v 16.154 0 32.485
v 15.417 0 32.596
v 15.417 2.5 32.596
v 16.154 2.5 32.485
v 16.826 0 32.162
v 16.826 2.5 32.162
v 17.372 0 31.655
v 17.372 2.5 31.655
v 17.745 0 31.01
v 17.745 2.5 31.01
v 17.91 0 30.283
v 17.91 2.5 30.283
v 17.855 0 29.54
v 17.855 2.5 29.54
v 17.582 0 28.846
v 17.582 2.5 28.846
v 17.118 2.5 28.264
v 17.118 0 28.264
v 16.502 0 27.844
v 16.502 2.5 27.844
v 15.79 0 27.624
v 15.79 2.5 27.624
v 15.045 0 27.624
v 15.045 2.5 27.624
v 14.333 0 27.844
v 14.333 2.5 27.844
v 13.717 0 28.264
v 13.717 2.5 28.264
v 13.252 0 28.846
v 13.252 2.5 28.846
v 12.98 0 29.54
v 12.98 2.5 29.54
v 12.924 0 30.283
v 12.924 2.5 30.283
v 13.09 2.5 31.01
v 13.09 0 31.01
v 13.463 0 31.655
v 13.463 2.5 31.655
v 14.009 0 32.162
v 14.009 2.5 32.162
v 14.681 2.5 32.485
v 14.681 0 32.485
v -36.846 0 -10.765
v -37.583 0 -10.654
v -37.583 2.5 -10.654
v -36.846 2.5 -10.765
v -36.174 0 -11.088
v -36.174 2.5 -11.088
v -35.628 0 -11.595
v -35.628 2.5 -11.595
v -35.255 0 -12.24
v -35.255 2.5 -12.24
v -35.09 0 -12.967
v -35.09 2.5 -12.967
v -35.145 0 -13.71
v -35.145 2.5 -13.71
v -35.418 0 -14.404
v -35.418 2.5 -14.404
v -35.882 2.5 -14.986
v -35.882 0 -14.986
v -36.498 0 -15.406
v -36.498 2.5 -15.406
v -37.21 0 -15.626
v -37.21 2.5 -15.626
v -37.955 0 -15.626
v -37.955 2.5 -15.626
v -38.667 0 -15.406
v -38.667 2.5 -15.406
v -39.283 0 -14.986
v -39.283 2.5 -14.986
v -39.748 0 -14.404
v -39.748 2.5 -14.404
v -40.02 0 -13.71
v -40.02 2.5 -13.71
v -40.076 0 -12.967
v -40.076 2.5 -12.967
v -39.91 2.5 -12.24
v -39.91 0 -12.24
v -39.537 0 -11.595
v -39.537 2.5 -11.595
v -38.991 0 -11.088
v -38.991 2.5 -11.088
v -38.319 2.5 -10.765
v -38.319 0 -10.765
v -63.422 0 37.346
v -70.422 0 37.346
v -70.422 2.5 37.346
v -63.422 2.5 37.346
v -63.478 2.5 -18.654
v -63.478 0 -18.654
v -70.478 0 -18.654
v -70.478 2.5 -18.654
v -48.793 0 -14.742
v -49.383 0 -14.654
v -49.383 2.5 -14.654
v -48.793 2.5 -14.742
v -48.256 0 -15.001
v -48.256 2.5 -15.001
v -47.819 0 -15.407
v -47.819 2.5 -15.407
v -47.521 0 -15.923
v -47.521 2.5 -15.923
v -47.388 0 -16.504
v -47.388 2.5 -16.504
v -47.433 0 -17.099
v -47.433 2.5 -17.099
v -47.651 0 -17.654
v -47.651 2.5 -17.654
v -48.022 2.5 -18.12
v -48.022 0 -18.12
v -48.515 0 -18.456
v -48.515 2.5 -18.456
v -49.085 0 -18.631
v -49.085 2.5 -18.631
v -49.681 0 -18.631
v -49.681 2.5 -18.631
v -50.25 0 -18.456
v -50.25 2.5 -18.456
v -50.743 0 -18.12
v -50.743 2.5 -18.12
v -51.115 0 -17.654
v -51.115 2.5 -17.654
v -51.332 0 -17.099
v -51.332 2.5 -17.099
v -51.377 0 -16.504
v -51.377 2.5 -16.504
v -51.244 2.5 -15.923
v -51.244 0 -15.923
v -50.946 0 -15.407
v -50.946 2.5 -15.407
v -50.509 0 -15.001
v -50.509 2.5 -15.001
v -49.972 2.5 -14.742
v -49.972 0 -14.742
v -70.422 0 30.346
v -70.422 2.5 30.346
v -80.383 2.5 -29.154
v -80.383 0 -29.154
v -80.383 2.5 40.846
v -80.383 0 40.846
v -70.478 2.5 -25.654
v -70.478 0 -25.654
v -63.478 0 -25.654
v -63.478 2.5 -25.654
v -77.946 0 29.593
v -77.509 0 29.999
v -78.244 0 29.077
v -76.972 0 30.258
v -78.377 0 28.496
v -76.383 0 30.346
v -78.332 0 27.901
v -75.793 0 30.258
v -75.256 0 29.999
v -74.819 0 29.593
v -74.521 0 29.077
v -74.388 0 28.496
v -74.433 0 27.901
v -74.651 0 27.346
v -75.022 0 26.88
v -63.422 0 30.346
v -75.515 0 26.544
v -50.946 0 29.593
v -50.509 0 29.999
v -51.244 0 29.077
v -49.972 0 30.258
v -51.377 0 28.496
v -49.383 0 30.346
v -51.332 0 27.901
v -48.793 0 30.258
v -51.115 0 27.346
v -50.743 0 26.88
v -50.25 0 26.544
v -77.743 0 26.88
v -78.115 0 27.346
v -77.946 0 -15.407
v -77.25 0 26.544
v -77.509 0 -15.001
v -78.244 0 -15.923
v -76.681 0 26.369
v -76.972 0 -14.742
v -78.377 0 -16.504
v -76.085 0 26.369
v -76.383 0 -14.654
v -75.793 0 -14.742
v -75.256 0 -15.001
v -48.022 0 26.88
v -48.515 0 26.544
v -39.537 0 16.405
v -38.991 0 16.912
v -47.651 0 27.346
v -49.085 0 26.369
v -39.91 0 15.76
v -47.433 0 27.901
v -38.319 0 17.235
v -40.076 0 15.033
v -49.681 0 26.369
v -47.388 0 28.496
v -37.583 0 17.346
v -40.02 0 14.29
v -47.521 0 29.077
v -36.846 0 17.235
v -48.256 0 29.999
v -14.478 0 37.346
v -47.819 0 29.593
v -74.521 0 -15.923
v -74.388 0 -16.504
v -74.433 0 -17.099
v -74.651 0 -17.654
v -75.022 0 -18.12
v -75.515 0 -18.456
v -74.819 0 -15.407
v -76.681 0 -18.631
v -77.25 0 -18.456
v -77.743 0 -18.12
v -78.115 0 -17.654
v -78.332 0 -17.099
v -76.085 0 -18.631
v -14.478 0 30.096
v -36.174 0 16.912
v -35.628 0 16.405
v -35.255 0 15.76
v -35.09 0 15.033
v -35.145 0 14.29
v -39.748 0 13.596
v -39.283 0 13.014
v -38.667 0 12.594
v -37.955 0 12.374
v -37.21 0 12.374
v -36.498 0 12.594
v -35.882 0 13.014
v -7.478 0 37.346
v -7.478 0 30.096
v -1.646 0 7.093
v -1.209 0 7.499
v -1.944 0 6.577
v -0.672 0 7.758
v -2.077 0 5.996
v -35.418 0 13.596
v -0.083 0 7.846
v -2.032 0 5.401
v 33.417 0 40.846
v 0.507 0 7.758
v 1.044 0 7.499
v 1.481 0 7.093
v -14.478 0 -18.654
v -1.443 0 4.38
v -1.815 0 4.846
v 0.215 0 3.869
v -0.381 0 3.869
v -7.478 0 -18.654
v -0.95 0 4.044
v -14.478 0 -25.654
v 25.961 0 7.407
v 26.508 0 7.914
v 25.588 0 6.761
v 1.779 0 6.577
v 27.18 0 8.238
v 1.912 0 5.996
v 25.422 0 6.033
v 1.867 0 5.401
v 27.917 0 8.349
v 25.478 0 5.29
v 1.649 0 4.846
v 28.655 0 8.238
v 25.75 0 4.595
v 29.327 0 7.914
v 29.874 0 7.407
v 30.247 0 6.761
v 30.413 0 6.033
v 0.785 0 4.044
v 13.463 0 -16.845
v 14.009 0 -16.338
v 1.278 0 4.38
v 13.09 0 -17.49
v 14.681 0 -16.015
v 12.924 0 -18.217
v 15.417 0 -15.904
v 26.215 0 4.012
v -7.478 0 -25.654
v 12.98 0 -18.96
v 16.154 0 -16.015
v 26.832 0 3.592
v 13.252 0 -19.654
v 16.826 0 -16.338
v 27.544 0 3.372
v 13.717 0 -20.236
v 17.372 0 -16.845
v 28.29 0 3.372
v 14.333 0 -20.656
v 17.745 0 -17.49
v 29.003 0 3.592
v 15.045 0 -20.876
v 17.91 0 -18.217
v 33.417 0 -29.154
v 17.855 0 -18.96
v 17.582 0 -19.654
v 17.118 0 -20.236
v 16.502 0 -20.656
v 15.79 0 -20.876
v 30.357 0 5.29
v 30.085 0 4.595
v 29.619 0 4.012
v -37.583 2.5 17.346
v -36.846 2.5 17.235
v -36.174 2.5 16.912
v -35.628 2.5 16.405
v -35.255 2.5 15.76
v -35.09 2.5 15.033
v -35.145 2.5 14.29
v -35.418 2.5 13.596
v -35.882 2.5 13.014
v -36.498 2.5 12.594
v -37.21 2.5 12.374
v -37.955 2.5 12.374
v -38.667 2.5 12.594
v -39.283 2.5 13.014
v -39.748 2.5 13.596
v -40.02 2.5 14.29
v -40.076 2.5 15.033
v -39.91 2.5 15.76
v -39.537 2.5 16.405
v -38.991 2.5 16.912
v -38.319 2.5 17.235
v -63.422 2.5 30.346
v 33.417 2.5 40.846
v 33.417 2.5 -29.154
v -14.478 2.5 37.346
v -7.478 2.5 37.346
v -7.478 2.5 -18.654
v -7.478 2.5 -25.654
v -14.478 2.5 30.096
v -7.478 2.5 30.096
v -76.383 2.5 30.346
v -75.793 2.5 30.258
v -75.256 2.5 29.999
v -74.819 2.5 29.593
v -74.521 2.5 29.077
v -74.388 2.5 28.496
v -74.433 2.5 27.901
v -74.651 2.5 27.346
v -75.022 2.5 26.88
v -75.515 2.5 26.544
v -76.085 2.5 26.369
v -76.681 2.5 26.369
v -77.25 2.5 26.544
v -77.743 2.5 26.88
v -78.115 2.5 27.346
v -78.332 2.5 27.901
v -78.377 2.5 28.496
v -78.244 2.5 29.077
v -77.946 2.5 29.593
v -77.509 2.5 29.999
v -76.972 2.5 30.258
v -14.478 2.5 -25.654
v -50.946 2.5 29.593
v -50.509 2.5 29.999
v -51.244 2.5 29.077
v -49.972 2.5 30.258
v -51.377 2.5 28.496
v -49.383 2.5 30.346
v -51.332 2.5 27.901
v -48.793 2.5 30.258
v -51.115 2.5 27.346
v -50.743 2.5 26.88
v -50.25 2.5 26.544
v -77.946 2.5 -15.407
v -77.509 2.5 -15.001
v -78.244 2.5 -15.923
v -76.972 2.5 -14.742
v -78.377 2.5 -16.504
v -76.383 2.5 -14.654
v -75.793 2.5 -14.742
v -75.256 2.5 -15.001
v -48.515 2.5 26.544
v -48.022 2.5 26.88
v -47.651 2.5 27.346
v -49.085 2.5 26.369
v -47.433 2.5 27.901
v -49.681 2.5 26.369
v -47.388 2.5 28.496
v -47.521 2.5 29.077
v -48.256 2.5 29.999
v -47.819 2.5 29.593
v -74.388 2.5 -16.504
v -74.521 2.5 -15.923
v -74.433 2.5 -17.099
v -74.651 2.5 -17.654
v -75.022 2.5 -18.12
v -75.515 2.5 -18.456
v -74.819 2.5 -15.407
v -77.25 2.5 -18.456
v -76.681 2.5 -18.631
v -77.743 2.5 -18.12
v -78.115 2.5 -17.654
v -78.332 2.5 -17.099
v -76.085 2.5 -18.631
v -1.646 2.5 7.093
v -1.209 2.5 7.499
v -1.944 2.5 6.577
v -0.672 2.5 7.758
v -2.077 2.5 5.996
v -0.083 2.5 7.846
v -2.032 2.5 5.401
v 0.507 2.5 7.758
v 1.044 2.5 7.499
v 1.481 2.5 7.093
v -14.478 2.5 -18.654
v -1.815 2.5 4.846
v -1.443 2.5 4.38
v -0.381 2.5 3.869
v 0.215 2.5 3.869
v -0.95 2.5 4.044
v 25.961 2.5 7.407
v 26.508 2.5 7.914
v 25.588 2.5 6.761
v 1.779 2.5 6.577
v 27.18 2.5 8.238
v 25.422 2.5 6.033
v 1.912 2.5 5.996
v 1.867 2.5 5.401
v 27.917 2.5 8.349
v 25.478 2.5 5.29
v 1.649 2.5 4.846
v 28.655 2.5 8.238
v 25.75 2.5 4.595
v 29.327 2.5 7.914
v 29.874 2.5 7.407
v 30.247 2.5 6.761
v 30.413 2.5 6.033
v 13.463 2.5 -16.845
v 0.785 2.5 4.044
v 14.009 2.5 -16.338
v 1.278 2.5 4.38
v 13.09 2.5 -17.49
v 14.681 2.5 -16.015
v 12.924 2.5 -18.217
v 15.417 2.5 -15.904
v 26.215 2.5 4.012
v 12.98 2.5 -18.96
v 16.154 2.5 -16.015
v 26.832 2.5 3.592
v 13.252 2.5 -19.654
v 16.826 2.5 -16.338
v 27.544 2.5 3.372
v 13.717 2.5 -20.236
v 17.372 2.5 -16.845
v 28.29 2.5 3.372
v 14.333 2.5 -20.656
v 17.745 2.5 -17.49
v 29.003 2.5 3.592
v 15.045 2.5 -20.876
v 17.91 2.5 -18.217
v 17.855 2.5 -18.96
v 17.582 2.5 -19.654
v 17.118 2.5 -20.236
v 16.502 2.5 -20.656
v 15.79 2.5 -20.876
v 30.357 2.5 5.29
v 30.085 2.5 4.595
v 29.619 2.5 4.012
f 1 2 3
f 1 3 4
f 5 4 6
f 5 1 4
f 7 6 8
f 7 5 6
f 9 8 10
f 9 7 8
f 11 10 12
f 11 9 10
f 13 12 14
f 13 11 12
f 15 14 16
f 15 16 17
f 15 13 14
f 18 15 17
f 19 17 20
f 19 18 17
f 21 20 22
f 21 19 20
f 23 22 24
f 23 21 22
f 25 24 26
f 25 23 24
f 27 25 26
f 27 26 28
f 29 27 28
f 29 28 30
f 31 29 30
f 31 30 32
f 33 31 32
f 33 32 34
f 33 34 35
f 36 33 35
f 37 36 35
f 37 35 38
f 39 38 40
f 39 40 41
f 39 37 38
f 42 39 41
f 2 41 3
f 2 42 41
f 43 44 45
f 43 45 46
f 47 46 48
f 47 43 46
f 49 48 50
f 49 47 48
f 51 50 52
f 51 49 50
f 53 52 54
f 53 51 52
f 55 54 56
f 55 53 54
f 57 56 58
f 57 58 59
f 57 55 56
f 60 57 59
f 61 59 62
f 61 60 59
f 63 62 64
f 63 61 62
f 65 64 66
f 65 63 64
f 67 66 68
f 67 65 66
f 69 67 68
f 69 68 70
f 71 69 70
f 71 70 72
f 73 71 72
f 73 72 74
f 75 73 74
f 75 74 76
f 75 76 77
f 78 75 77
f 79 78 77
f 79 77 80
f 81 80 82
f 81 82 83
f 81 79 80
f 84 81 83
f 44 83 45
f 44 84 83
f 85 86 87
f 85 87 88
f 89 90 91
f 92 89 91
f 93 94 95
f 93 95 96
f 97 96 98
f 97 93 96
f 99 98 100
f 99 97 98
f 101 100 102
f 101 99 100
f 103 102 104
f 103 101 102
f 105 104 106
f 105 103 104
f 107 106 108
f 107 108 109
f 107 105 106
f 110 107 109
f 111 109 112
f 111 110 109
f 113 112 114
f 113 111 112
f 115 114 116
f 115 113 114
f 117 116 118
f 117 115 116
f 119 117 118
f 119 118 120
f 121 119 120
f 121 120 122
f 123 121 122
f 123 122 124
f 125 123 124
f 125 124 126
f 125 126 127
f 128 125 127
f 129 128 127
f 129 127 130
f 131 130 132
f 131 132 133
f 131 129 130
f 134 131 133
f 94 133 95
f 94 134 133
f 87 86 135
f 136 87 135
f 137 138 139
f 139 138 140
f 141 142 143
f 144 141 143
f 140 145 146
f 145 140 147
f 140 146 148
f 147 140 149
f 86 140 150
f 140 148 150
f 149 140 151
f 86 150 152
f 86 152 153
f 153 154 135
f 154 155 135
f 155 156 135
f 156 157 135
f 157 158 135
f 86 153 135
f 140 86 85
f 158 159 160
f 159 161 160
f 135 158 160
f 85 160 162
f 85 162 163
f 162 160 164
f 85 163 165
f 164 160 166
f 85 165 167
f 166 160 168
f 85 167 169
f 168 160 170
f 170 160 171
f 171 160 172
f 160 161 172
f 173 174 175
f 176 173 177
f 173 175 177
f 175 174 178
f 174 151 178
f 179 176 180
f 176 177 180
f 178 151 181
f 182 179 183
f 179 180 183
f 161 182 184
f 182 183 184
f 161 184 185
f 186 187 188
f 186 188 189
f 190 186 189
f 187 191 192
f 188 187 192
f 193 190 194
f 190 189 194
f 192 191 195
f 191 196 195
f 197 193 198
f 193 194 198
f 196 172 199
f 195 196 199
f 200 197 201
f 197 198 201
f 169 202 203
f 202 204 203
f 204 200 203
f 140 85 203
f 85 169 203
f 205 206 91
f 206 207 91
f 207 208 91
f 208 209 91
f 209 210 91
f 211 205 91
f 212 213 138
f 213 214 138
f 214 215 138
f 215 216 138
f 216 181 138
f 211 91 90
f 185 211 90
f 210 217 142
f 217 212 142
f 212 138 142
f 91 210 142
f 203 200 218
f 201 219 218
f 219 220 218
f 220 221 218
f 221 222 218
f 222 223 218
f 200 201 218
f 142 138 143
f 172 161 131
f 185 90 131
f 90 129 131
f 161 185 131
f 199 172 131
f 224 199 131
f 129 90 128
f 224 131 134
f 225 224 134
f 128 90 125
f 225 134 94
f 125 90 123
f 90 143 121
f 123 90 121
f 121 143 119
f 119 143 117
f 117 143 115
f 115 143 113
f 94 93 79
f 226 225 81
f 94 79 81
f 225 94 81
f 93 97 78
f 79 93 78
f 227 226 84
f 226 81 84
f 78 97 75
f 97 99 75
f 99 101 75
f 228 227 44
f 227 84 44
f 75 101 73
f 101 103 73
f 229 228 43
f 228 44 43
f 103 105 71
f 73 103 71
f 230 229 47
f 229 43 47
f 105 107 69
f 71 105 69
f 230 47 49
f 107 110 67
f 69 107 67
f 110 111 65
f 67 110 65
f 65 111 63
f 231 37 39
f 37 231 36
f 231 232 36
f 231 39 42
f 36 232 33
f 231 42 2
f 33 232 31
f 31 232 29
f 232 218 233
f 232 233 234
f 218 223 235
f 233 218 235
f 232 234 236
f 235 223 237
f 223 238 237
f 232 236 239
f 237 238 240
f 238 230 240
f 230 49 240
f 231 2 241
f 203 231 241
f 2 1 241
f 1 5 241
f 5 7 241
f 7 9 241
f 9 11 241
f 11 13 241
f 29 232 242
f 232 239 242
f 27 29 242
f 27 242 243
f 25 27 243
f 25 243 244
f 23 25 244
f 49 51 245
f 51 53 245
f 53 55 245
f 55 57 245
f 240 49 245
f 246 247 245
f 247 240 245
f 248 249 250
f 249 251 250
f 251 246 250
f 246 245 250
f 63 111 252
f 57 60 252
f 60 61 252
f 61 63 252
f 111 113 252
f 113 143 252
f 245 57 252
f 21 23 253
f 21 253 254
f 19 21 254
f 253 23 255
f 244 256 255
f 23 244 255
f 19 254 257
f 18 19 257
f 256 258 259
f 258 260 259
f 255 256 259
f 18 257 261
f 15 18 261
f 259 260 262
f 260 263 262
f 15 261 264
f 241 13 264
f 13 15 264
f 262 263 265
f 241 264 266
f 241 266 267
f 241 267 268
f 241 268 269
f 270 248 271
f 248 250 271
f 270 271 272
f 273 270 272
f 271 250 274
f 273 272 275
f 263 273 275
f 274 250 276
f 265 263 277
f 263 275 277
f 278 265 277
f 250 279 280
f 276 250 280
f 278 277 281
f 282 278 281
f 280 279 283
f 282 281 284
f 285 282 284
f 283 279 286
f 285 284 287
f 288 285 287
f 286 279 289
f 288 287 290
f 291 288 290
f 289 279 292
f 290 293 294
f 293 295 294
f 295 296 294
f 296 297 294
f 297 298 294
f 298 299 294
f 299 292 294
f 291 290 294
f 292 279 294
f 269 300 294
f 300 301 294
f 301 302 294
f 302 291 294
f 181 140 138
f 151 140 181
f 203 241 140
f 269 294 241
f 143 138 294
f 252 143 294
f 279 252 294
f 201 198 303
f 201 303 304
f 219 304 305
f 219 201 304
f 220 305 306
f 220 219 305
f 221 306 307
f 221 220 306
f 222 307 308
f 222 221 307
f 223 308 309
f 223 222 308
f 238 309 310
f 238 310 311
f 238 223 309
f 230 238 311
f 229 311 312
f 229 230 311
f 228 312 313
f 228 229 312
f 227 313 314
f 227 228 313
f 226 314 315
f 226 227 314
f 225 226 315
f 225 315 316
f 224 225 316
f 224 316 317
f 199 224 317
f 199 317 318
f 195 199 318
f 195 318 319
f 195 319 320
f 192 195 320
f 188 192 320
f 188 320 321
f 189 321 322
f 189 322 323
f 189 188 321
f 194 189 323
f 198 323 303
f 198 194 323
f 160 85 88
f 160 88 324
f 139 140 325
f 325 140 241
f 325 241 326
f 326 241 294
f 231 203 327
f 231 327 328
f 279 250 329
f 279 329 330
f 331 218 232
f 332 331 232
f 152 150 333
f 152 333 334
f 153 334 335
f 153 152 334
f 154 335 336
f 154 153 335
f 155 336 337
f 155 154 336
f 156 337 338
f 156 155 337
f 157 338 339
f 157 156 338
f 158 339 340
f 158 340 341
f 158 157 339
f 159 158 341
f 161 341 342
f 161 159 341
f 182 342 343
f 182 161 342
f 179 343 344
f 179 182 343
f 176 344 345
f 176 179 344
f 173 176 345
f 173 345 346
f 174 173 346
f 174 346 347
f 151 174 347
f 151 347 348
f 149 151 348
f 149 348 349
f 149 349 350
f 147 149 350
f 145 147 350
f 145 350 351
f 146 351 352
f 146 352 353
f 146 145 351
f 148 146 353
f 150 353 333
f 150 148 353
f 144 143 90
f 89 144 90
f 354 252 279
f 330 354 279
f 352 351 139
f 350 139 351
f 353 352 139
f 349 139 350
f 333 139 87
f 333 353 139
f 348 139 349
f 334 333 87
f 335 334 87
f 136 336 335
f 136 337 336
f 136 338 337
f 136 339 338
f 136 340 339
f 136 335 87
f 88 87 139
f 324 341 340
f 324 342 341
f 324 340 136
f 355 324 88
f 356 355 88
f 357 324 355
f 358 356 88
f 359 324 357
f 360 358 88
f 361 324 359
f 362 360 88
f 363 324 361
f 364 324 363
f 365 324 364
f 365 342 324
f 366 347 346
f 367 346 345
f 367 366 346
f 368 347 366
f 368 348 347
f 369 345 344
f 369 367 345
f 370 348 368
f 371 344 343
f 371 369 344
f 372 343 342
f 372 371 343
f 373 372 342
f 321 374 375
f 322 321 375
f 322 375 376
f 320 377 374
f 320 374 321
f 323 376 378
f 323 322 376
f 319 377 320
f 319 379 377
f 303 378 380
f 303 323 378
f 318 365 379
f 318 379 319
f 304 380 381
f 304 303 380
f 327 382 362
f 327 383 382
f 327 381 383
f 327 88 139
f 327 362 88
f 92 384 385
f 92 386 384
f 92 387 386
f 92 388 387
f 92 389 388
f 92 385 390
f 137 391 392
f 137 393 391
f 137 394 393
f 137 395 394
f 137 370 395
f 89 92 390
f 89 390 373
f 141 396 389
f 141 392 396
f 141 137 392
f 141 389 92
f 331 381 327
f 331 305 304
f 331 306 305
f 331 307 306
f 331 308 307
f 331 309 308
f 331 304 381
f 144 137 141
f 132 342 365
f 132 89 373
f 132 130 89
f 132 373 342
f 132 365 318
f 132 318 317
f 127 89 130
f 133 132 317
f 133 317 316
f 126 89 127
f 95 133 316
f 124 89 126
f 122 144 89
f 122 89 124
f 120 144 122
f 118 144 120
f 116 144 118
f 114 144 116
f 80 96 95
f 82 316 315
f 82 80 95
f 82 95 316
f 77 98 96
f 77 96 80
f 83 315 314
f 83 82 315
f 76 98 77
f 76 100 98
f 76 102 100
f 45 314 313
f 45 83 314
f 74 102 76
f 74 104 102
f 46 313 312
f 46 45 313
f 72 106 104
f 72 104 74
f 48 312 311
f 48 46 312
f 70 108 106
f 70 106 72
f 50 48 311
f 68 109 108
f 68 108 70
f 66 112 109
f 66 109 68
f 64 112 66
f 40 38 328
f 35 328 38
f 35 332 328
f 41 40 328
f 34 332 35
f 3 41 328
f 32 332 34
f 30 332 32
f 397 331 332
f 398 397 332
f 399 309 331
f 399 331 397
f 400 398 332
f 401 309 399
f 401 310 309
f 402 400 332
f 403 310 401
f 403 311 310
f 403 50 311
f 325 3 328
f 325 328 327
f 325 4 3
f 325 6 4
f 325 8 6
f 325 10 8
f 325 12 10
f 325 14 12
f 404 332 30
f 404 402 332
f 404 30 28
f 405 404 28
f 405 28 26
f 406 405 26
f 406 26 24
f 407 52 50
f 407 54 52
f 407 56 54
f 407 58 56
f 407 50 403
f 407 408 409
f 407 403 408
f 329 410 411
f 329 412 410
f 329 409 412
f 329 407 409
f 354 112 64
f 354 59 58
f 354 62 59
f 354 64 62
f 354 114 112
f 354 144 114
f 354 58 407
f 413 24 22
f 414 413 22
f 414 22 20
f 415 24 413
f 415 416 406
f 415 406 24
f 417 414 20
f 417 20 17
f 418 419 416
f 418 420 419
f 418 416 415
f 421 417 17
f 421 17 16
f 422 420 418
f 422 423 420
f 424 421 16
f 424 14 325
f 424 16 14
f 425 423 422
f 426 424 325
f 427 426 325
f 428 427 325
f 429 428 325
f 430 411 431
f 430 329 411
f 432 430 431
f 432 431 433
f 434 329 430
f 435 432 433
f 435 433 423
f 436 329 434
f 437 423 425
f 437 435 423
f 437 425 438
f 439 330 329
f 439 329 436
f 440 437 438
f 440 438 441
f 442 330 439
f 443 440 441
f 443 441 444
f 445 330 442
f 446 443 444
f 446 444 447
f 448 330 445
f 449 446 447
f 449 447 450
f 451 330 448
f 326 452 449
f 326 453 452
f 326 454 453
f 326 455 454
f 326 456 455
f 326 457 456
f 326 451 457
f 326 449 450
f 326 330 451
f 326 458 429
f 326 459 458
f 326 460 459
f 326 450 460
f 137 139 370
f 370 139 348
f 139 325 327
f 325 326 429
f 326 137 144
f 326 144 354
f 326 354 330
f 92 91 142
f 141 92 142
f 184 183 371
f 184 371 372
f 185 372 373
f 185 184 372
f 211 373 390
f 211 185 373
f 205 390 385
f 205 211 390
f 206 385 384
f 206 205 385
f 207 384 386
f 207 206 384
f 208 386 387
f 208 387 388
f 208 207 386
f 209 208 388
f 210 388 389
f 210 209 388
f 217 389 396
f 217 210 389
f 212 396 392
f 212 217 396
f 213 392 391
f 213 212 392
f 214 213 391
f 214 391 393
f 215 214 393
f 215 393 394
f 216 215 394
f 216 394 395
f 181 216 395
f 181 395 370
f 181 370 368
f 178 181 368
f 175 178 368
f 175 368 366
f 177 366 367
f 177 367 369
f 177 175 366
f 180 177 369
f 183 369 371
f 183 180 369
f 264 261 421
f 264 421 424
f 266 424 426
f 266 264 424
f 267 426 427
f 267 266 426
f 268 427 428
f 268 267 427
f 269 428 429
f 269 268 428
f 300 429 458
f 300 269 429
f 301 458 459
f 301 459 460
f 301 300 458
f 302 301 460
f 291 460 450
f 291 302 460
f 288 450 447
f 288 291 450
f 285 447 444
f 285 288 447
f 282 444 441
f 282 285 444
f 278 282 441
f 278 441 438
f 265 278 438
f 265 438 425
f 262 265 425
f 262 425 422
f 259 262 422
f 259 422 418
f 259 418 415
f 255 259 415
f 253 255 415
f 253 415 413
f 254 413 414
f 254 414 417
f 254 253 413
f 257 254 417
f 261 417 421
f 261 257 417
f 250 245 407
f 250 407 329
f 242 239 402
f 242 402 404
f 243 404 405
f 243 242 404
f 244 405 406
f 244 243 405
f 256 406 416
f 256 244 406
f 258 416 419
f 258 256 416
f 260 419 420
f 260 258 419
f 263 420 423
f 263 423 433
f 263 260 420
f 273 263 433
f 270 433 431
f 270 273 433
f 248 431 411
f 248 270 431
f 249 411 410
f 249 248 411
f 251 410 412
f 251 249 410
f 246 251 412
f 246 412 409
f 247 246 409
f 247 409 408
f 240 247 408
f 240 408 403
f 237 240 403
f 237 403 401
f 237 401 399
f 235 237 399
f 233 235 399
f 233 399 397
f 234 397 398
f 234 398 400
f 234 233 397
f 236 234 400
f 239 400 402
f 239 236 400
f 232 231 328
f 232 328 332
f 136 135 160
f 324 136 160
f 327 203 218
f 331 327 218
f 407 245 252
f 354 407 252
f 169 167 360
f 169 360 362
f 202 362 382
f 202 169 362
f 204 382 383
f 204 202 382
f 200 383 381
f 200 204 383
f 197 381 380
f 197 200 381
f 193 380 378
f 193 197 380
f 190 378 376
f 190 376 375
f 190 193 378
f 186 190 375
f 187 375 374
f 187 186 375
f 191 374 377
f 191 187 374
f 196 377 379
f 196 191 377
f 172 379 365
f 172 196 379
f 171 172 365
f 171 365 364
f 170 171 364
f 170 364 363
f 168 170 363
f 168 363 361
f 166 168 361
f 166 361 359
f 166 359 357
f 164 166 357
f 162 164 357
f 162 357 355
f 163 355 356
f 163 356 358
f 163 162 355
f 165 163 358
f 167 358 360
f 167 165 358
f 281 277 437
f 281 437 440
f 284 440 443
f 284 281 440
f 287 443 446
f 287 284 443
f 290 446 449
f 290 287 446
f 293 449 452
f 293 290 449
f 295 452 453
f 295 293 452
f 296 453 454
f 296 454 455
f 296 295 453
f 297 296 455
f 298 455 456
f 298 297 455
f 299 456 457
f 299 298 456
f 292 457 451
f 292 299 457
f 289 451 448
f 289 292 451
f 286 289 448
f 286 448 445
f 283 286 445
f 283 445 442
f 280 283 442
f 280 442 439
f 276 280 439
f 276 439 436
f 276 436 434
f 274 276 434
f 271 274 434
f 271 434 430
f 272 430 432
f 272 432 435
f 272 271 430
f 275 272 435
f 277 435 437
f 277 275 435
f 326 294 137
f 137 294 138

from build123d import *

# Parameters (mm, degrees)
SKETCH1_W           = 7
SKETCH1_H           = 7
SKETCH1_R           = 2
SKETCH1_R_2         = 2.5
SKETCH1_H_2         = 7.25
SKETCH1_R_3         = 2.502389359
BOSS_EXTRUDE1_DEPTH = 2.5


with BuildPart() as part:
    # Sketch1 → Boss-Extrude1 (new body)
    with BuildSketch(Plane(origin=(0, 0, 0), x_dir=(1, 0, 0), z_dir=(0, 1, 0))):
        Polygon((-45.382608696, 29.153623188), (-80.382608696, 29.153623188), (-80.382608696, 25.653623188), (-80.382608696, 16.653623188), (-80.382608696, 4.153623188), (-80.382608696, -15.846376812), (-80.382608696, -28.346376812), (-80.382608696, -37.346376812), (-80.382608696, -40.846376812), (33.417391304, -40.846376812), (33.417391304, -5.846376812), (33.417391304, 29.153623188), (15.417391304, 29.153623188), (-37.582608696, 29.153623188), align=None)
        with Locations((-66.92185538, -33.846376812)):
            Rectangle(SKETCH1_W, SKETCH1_H, mode=Mode.SUBTRACT)
        with Locations(Location((-76.382608696, -28.346376812, 0), (0, 0, 270))):
            Circle(SKETCH1_R, mode=Mode.SUBTRACT)
        with Locations(Location((-49.382608696, -28.346376812, 0), (0, 0, 270))):
            Circle(SKETCH1_R, mode=Mode.SUBTRACT)
        with Locations(Location((-37.582608696, -14.846376812, 0), (0, 0, 270))):
            Circle(SKETCH1_R_2, mode=Mode.SUBTRACT)
        with Locations((-10.97764978, -33.721376812)):
            Rectangle(SKETCH1_W, SKETCH1_H_2, mode=Mode.SUBTRACT)
        with Locations(Location((15.417391304, -30.096376812, 0), (0, 0, 270))):
            Circle(SKETCH1_R_2, mode=Mode.SUBTRACT)
        with Locations(Location((-0.082608696, -5.846376812, 0), (0, 0, 270))):
            Circle(SKETCH1_R, mode=Mode.SUBTRACT)
        with Locations(Location((-76.382608696, 16.653623188, 0), (0, 0, 270))):
            Circle(SKETCH1_R, mode=Mode.SUBTRACT)
        Polygon((-70.47764978, 18.653623188), (-70.47764978, 25.653623188), (-70.42185538, 25.653623188), (-63.47764978, 25.653623188), (-63.47764978, 18.653623188), (-70.42185538, 18.653623188), align=None, mode=Mode.SUBTRACT)
        with Locations(Location((-49.382608696, 16.653623188, 0), (0, 0, 270))):
            Circle(SKETCH1_R, mode=Mode.SUBTRACT)
        with Locations(Location((-37.582608696, 13.153623188, 0), (0, 0, 270))):
            Circle(SKETCH1_R_2, mode=Mode.SUBTRACT)
        with Locations(Location((27.917391304, -5.846376812, 0), (0, 0, 270))):
            Circle(SKETCH1_R_3, mode=Mode.SUBTRACT)
        with Locations((-10.97764978, 22.153623188)):
            Rectangle(SKETCH1_W, SKETCH1_H, mode=Mode.SUBTRACT)
        with Locations(Location((15.417391304, 18.403623188, 0), (0, 0, 270))):
            Circle(SKETCH1_R_2, mode=Mode.SUBTRACT)
    extrude(amount=BOSS_EXTRUDE1_DEPTH)


solid = part.part
